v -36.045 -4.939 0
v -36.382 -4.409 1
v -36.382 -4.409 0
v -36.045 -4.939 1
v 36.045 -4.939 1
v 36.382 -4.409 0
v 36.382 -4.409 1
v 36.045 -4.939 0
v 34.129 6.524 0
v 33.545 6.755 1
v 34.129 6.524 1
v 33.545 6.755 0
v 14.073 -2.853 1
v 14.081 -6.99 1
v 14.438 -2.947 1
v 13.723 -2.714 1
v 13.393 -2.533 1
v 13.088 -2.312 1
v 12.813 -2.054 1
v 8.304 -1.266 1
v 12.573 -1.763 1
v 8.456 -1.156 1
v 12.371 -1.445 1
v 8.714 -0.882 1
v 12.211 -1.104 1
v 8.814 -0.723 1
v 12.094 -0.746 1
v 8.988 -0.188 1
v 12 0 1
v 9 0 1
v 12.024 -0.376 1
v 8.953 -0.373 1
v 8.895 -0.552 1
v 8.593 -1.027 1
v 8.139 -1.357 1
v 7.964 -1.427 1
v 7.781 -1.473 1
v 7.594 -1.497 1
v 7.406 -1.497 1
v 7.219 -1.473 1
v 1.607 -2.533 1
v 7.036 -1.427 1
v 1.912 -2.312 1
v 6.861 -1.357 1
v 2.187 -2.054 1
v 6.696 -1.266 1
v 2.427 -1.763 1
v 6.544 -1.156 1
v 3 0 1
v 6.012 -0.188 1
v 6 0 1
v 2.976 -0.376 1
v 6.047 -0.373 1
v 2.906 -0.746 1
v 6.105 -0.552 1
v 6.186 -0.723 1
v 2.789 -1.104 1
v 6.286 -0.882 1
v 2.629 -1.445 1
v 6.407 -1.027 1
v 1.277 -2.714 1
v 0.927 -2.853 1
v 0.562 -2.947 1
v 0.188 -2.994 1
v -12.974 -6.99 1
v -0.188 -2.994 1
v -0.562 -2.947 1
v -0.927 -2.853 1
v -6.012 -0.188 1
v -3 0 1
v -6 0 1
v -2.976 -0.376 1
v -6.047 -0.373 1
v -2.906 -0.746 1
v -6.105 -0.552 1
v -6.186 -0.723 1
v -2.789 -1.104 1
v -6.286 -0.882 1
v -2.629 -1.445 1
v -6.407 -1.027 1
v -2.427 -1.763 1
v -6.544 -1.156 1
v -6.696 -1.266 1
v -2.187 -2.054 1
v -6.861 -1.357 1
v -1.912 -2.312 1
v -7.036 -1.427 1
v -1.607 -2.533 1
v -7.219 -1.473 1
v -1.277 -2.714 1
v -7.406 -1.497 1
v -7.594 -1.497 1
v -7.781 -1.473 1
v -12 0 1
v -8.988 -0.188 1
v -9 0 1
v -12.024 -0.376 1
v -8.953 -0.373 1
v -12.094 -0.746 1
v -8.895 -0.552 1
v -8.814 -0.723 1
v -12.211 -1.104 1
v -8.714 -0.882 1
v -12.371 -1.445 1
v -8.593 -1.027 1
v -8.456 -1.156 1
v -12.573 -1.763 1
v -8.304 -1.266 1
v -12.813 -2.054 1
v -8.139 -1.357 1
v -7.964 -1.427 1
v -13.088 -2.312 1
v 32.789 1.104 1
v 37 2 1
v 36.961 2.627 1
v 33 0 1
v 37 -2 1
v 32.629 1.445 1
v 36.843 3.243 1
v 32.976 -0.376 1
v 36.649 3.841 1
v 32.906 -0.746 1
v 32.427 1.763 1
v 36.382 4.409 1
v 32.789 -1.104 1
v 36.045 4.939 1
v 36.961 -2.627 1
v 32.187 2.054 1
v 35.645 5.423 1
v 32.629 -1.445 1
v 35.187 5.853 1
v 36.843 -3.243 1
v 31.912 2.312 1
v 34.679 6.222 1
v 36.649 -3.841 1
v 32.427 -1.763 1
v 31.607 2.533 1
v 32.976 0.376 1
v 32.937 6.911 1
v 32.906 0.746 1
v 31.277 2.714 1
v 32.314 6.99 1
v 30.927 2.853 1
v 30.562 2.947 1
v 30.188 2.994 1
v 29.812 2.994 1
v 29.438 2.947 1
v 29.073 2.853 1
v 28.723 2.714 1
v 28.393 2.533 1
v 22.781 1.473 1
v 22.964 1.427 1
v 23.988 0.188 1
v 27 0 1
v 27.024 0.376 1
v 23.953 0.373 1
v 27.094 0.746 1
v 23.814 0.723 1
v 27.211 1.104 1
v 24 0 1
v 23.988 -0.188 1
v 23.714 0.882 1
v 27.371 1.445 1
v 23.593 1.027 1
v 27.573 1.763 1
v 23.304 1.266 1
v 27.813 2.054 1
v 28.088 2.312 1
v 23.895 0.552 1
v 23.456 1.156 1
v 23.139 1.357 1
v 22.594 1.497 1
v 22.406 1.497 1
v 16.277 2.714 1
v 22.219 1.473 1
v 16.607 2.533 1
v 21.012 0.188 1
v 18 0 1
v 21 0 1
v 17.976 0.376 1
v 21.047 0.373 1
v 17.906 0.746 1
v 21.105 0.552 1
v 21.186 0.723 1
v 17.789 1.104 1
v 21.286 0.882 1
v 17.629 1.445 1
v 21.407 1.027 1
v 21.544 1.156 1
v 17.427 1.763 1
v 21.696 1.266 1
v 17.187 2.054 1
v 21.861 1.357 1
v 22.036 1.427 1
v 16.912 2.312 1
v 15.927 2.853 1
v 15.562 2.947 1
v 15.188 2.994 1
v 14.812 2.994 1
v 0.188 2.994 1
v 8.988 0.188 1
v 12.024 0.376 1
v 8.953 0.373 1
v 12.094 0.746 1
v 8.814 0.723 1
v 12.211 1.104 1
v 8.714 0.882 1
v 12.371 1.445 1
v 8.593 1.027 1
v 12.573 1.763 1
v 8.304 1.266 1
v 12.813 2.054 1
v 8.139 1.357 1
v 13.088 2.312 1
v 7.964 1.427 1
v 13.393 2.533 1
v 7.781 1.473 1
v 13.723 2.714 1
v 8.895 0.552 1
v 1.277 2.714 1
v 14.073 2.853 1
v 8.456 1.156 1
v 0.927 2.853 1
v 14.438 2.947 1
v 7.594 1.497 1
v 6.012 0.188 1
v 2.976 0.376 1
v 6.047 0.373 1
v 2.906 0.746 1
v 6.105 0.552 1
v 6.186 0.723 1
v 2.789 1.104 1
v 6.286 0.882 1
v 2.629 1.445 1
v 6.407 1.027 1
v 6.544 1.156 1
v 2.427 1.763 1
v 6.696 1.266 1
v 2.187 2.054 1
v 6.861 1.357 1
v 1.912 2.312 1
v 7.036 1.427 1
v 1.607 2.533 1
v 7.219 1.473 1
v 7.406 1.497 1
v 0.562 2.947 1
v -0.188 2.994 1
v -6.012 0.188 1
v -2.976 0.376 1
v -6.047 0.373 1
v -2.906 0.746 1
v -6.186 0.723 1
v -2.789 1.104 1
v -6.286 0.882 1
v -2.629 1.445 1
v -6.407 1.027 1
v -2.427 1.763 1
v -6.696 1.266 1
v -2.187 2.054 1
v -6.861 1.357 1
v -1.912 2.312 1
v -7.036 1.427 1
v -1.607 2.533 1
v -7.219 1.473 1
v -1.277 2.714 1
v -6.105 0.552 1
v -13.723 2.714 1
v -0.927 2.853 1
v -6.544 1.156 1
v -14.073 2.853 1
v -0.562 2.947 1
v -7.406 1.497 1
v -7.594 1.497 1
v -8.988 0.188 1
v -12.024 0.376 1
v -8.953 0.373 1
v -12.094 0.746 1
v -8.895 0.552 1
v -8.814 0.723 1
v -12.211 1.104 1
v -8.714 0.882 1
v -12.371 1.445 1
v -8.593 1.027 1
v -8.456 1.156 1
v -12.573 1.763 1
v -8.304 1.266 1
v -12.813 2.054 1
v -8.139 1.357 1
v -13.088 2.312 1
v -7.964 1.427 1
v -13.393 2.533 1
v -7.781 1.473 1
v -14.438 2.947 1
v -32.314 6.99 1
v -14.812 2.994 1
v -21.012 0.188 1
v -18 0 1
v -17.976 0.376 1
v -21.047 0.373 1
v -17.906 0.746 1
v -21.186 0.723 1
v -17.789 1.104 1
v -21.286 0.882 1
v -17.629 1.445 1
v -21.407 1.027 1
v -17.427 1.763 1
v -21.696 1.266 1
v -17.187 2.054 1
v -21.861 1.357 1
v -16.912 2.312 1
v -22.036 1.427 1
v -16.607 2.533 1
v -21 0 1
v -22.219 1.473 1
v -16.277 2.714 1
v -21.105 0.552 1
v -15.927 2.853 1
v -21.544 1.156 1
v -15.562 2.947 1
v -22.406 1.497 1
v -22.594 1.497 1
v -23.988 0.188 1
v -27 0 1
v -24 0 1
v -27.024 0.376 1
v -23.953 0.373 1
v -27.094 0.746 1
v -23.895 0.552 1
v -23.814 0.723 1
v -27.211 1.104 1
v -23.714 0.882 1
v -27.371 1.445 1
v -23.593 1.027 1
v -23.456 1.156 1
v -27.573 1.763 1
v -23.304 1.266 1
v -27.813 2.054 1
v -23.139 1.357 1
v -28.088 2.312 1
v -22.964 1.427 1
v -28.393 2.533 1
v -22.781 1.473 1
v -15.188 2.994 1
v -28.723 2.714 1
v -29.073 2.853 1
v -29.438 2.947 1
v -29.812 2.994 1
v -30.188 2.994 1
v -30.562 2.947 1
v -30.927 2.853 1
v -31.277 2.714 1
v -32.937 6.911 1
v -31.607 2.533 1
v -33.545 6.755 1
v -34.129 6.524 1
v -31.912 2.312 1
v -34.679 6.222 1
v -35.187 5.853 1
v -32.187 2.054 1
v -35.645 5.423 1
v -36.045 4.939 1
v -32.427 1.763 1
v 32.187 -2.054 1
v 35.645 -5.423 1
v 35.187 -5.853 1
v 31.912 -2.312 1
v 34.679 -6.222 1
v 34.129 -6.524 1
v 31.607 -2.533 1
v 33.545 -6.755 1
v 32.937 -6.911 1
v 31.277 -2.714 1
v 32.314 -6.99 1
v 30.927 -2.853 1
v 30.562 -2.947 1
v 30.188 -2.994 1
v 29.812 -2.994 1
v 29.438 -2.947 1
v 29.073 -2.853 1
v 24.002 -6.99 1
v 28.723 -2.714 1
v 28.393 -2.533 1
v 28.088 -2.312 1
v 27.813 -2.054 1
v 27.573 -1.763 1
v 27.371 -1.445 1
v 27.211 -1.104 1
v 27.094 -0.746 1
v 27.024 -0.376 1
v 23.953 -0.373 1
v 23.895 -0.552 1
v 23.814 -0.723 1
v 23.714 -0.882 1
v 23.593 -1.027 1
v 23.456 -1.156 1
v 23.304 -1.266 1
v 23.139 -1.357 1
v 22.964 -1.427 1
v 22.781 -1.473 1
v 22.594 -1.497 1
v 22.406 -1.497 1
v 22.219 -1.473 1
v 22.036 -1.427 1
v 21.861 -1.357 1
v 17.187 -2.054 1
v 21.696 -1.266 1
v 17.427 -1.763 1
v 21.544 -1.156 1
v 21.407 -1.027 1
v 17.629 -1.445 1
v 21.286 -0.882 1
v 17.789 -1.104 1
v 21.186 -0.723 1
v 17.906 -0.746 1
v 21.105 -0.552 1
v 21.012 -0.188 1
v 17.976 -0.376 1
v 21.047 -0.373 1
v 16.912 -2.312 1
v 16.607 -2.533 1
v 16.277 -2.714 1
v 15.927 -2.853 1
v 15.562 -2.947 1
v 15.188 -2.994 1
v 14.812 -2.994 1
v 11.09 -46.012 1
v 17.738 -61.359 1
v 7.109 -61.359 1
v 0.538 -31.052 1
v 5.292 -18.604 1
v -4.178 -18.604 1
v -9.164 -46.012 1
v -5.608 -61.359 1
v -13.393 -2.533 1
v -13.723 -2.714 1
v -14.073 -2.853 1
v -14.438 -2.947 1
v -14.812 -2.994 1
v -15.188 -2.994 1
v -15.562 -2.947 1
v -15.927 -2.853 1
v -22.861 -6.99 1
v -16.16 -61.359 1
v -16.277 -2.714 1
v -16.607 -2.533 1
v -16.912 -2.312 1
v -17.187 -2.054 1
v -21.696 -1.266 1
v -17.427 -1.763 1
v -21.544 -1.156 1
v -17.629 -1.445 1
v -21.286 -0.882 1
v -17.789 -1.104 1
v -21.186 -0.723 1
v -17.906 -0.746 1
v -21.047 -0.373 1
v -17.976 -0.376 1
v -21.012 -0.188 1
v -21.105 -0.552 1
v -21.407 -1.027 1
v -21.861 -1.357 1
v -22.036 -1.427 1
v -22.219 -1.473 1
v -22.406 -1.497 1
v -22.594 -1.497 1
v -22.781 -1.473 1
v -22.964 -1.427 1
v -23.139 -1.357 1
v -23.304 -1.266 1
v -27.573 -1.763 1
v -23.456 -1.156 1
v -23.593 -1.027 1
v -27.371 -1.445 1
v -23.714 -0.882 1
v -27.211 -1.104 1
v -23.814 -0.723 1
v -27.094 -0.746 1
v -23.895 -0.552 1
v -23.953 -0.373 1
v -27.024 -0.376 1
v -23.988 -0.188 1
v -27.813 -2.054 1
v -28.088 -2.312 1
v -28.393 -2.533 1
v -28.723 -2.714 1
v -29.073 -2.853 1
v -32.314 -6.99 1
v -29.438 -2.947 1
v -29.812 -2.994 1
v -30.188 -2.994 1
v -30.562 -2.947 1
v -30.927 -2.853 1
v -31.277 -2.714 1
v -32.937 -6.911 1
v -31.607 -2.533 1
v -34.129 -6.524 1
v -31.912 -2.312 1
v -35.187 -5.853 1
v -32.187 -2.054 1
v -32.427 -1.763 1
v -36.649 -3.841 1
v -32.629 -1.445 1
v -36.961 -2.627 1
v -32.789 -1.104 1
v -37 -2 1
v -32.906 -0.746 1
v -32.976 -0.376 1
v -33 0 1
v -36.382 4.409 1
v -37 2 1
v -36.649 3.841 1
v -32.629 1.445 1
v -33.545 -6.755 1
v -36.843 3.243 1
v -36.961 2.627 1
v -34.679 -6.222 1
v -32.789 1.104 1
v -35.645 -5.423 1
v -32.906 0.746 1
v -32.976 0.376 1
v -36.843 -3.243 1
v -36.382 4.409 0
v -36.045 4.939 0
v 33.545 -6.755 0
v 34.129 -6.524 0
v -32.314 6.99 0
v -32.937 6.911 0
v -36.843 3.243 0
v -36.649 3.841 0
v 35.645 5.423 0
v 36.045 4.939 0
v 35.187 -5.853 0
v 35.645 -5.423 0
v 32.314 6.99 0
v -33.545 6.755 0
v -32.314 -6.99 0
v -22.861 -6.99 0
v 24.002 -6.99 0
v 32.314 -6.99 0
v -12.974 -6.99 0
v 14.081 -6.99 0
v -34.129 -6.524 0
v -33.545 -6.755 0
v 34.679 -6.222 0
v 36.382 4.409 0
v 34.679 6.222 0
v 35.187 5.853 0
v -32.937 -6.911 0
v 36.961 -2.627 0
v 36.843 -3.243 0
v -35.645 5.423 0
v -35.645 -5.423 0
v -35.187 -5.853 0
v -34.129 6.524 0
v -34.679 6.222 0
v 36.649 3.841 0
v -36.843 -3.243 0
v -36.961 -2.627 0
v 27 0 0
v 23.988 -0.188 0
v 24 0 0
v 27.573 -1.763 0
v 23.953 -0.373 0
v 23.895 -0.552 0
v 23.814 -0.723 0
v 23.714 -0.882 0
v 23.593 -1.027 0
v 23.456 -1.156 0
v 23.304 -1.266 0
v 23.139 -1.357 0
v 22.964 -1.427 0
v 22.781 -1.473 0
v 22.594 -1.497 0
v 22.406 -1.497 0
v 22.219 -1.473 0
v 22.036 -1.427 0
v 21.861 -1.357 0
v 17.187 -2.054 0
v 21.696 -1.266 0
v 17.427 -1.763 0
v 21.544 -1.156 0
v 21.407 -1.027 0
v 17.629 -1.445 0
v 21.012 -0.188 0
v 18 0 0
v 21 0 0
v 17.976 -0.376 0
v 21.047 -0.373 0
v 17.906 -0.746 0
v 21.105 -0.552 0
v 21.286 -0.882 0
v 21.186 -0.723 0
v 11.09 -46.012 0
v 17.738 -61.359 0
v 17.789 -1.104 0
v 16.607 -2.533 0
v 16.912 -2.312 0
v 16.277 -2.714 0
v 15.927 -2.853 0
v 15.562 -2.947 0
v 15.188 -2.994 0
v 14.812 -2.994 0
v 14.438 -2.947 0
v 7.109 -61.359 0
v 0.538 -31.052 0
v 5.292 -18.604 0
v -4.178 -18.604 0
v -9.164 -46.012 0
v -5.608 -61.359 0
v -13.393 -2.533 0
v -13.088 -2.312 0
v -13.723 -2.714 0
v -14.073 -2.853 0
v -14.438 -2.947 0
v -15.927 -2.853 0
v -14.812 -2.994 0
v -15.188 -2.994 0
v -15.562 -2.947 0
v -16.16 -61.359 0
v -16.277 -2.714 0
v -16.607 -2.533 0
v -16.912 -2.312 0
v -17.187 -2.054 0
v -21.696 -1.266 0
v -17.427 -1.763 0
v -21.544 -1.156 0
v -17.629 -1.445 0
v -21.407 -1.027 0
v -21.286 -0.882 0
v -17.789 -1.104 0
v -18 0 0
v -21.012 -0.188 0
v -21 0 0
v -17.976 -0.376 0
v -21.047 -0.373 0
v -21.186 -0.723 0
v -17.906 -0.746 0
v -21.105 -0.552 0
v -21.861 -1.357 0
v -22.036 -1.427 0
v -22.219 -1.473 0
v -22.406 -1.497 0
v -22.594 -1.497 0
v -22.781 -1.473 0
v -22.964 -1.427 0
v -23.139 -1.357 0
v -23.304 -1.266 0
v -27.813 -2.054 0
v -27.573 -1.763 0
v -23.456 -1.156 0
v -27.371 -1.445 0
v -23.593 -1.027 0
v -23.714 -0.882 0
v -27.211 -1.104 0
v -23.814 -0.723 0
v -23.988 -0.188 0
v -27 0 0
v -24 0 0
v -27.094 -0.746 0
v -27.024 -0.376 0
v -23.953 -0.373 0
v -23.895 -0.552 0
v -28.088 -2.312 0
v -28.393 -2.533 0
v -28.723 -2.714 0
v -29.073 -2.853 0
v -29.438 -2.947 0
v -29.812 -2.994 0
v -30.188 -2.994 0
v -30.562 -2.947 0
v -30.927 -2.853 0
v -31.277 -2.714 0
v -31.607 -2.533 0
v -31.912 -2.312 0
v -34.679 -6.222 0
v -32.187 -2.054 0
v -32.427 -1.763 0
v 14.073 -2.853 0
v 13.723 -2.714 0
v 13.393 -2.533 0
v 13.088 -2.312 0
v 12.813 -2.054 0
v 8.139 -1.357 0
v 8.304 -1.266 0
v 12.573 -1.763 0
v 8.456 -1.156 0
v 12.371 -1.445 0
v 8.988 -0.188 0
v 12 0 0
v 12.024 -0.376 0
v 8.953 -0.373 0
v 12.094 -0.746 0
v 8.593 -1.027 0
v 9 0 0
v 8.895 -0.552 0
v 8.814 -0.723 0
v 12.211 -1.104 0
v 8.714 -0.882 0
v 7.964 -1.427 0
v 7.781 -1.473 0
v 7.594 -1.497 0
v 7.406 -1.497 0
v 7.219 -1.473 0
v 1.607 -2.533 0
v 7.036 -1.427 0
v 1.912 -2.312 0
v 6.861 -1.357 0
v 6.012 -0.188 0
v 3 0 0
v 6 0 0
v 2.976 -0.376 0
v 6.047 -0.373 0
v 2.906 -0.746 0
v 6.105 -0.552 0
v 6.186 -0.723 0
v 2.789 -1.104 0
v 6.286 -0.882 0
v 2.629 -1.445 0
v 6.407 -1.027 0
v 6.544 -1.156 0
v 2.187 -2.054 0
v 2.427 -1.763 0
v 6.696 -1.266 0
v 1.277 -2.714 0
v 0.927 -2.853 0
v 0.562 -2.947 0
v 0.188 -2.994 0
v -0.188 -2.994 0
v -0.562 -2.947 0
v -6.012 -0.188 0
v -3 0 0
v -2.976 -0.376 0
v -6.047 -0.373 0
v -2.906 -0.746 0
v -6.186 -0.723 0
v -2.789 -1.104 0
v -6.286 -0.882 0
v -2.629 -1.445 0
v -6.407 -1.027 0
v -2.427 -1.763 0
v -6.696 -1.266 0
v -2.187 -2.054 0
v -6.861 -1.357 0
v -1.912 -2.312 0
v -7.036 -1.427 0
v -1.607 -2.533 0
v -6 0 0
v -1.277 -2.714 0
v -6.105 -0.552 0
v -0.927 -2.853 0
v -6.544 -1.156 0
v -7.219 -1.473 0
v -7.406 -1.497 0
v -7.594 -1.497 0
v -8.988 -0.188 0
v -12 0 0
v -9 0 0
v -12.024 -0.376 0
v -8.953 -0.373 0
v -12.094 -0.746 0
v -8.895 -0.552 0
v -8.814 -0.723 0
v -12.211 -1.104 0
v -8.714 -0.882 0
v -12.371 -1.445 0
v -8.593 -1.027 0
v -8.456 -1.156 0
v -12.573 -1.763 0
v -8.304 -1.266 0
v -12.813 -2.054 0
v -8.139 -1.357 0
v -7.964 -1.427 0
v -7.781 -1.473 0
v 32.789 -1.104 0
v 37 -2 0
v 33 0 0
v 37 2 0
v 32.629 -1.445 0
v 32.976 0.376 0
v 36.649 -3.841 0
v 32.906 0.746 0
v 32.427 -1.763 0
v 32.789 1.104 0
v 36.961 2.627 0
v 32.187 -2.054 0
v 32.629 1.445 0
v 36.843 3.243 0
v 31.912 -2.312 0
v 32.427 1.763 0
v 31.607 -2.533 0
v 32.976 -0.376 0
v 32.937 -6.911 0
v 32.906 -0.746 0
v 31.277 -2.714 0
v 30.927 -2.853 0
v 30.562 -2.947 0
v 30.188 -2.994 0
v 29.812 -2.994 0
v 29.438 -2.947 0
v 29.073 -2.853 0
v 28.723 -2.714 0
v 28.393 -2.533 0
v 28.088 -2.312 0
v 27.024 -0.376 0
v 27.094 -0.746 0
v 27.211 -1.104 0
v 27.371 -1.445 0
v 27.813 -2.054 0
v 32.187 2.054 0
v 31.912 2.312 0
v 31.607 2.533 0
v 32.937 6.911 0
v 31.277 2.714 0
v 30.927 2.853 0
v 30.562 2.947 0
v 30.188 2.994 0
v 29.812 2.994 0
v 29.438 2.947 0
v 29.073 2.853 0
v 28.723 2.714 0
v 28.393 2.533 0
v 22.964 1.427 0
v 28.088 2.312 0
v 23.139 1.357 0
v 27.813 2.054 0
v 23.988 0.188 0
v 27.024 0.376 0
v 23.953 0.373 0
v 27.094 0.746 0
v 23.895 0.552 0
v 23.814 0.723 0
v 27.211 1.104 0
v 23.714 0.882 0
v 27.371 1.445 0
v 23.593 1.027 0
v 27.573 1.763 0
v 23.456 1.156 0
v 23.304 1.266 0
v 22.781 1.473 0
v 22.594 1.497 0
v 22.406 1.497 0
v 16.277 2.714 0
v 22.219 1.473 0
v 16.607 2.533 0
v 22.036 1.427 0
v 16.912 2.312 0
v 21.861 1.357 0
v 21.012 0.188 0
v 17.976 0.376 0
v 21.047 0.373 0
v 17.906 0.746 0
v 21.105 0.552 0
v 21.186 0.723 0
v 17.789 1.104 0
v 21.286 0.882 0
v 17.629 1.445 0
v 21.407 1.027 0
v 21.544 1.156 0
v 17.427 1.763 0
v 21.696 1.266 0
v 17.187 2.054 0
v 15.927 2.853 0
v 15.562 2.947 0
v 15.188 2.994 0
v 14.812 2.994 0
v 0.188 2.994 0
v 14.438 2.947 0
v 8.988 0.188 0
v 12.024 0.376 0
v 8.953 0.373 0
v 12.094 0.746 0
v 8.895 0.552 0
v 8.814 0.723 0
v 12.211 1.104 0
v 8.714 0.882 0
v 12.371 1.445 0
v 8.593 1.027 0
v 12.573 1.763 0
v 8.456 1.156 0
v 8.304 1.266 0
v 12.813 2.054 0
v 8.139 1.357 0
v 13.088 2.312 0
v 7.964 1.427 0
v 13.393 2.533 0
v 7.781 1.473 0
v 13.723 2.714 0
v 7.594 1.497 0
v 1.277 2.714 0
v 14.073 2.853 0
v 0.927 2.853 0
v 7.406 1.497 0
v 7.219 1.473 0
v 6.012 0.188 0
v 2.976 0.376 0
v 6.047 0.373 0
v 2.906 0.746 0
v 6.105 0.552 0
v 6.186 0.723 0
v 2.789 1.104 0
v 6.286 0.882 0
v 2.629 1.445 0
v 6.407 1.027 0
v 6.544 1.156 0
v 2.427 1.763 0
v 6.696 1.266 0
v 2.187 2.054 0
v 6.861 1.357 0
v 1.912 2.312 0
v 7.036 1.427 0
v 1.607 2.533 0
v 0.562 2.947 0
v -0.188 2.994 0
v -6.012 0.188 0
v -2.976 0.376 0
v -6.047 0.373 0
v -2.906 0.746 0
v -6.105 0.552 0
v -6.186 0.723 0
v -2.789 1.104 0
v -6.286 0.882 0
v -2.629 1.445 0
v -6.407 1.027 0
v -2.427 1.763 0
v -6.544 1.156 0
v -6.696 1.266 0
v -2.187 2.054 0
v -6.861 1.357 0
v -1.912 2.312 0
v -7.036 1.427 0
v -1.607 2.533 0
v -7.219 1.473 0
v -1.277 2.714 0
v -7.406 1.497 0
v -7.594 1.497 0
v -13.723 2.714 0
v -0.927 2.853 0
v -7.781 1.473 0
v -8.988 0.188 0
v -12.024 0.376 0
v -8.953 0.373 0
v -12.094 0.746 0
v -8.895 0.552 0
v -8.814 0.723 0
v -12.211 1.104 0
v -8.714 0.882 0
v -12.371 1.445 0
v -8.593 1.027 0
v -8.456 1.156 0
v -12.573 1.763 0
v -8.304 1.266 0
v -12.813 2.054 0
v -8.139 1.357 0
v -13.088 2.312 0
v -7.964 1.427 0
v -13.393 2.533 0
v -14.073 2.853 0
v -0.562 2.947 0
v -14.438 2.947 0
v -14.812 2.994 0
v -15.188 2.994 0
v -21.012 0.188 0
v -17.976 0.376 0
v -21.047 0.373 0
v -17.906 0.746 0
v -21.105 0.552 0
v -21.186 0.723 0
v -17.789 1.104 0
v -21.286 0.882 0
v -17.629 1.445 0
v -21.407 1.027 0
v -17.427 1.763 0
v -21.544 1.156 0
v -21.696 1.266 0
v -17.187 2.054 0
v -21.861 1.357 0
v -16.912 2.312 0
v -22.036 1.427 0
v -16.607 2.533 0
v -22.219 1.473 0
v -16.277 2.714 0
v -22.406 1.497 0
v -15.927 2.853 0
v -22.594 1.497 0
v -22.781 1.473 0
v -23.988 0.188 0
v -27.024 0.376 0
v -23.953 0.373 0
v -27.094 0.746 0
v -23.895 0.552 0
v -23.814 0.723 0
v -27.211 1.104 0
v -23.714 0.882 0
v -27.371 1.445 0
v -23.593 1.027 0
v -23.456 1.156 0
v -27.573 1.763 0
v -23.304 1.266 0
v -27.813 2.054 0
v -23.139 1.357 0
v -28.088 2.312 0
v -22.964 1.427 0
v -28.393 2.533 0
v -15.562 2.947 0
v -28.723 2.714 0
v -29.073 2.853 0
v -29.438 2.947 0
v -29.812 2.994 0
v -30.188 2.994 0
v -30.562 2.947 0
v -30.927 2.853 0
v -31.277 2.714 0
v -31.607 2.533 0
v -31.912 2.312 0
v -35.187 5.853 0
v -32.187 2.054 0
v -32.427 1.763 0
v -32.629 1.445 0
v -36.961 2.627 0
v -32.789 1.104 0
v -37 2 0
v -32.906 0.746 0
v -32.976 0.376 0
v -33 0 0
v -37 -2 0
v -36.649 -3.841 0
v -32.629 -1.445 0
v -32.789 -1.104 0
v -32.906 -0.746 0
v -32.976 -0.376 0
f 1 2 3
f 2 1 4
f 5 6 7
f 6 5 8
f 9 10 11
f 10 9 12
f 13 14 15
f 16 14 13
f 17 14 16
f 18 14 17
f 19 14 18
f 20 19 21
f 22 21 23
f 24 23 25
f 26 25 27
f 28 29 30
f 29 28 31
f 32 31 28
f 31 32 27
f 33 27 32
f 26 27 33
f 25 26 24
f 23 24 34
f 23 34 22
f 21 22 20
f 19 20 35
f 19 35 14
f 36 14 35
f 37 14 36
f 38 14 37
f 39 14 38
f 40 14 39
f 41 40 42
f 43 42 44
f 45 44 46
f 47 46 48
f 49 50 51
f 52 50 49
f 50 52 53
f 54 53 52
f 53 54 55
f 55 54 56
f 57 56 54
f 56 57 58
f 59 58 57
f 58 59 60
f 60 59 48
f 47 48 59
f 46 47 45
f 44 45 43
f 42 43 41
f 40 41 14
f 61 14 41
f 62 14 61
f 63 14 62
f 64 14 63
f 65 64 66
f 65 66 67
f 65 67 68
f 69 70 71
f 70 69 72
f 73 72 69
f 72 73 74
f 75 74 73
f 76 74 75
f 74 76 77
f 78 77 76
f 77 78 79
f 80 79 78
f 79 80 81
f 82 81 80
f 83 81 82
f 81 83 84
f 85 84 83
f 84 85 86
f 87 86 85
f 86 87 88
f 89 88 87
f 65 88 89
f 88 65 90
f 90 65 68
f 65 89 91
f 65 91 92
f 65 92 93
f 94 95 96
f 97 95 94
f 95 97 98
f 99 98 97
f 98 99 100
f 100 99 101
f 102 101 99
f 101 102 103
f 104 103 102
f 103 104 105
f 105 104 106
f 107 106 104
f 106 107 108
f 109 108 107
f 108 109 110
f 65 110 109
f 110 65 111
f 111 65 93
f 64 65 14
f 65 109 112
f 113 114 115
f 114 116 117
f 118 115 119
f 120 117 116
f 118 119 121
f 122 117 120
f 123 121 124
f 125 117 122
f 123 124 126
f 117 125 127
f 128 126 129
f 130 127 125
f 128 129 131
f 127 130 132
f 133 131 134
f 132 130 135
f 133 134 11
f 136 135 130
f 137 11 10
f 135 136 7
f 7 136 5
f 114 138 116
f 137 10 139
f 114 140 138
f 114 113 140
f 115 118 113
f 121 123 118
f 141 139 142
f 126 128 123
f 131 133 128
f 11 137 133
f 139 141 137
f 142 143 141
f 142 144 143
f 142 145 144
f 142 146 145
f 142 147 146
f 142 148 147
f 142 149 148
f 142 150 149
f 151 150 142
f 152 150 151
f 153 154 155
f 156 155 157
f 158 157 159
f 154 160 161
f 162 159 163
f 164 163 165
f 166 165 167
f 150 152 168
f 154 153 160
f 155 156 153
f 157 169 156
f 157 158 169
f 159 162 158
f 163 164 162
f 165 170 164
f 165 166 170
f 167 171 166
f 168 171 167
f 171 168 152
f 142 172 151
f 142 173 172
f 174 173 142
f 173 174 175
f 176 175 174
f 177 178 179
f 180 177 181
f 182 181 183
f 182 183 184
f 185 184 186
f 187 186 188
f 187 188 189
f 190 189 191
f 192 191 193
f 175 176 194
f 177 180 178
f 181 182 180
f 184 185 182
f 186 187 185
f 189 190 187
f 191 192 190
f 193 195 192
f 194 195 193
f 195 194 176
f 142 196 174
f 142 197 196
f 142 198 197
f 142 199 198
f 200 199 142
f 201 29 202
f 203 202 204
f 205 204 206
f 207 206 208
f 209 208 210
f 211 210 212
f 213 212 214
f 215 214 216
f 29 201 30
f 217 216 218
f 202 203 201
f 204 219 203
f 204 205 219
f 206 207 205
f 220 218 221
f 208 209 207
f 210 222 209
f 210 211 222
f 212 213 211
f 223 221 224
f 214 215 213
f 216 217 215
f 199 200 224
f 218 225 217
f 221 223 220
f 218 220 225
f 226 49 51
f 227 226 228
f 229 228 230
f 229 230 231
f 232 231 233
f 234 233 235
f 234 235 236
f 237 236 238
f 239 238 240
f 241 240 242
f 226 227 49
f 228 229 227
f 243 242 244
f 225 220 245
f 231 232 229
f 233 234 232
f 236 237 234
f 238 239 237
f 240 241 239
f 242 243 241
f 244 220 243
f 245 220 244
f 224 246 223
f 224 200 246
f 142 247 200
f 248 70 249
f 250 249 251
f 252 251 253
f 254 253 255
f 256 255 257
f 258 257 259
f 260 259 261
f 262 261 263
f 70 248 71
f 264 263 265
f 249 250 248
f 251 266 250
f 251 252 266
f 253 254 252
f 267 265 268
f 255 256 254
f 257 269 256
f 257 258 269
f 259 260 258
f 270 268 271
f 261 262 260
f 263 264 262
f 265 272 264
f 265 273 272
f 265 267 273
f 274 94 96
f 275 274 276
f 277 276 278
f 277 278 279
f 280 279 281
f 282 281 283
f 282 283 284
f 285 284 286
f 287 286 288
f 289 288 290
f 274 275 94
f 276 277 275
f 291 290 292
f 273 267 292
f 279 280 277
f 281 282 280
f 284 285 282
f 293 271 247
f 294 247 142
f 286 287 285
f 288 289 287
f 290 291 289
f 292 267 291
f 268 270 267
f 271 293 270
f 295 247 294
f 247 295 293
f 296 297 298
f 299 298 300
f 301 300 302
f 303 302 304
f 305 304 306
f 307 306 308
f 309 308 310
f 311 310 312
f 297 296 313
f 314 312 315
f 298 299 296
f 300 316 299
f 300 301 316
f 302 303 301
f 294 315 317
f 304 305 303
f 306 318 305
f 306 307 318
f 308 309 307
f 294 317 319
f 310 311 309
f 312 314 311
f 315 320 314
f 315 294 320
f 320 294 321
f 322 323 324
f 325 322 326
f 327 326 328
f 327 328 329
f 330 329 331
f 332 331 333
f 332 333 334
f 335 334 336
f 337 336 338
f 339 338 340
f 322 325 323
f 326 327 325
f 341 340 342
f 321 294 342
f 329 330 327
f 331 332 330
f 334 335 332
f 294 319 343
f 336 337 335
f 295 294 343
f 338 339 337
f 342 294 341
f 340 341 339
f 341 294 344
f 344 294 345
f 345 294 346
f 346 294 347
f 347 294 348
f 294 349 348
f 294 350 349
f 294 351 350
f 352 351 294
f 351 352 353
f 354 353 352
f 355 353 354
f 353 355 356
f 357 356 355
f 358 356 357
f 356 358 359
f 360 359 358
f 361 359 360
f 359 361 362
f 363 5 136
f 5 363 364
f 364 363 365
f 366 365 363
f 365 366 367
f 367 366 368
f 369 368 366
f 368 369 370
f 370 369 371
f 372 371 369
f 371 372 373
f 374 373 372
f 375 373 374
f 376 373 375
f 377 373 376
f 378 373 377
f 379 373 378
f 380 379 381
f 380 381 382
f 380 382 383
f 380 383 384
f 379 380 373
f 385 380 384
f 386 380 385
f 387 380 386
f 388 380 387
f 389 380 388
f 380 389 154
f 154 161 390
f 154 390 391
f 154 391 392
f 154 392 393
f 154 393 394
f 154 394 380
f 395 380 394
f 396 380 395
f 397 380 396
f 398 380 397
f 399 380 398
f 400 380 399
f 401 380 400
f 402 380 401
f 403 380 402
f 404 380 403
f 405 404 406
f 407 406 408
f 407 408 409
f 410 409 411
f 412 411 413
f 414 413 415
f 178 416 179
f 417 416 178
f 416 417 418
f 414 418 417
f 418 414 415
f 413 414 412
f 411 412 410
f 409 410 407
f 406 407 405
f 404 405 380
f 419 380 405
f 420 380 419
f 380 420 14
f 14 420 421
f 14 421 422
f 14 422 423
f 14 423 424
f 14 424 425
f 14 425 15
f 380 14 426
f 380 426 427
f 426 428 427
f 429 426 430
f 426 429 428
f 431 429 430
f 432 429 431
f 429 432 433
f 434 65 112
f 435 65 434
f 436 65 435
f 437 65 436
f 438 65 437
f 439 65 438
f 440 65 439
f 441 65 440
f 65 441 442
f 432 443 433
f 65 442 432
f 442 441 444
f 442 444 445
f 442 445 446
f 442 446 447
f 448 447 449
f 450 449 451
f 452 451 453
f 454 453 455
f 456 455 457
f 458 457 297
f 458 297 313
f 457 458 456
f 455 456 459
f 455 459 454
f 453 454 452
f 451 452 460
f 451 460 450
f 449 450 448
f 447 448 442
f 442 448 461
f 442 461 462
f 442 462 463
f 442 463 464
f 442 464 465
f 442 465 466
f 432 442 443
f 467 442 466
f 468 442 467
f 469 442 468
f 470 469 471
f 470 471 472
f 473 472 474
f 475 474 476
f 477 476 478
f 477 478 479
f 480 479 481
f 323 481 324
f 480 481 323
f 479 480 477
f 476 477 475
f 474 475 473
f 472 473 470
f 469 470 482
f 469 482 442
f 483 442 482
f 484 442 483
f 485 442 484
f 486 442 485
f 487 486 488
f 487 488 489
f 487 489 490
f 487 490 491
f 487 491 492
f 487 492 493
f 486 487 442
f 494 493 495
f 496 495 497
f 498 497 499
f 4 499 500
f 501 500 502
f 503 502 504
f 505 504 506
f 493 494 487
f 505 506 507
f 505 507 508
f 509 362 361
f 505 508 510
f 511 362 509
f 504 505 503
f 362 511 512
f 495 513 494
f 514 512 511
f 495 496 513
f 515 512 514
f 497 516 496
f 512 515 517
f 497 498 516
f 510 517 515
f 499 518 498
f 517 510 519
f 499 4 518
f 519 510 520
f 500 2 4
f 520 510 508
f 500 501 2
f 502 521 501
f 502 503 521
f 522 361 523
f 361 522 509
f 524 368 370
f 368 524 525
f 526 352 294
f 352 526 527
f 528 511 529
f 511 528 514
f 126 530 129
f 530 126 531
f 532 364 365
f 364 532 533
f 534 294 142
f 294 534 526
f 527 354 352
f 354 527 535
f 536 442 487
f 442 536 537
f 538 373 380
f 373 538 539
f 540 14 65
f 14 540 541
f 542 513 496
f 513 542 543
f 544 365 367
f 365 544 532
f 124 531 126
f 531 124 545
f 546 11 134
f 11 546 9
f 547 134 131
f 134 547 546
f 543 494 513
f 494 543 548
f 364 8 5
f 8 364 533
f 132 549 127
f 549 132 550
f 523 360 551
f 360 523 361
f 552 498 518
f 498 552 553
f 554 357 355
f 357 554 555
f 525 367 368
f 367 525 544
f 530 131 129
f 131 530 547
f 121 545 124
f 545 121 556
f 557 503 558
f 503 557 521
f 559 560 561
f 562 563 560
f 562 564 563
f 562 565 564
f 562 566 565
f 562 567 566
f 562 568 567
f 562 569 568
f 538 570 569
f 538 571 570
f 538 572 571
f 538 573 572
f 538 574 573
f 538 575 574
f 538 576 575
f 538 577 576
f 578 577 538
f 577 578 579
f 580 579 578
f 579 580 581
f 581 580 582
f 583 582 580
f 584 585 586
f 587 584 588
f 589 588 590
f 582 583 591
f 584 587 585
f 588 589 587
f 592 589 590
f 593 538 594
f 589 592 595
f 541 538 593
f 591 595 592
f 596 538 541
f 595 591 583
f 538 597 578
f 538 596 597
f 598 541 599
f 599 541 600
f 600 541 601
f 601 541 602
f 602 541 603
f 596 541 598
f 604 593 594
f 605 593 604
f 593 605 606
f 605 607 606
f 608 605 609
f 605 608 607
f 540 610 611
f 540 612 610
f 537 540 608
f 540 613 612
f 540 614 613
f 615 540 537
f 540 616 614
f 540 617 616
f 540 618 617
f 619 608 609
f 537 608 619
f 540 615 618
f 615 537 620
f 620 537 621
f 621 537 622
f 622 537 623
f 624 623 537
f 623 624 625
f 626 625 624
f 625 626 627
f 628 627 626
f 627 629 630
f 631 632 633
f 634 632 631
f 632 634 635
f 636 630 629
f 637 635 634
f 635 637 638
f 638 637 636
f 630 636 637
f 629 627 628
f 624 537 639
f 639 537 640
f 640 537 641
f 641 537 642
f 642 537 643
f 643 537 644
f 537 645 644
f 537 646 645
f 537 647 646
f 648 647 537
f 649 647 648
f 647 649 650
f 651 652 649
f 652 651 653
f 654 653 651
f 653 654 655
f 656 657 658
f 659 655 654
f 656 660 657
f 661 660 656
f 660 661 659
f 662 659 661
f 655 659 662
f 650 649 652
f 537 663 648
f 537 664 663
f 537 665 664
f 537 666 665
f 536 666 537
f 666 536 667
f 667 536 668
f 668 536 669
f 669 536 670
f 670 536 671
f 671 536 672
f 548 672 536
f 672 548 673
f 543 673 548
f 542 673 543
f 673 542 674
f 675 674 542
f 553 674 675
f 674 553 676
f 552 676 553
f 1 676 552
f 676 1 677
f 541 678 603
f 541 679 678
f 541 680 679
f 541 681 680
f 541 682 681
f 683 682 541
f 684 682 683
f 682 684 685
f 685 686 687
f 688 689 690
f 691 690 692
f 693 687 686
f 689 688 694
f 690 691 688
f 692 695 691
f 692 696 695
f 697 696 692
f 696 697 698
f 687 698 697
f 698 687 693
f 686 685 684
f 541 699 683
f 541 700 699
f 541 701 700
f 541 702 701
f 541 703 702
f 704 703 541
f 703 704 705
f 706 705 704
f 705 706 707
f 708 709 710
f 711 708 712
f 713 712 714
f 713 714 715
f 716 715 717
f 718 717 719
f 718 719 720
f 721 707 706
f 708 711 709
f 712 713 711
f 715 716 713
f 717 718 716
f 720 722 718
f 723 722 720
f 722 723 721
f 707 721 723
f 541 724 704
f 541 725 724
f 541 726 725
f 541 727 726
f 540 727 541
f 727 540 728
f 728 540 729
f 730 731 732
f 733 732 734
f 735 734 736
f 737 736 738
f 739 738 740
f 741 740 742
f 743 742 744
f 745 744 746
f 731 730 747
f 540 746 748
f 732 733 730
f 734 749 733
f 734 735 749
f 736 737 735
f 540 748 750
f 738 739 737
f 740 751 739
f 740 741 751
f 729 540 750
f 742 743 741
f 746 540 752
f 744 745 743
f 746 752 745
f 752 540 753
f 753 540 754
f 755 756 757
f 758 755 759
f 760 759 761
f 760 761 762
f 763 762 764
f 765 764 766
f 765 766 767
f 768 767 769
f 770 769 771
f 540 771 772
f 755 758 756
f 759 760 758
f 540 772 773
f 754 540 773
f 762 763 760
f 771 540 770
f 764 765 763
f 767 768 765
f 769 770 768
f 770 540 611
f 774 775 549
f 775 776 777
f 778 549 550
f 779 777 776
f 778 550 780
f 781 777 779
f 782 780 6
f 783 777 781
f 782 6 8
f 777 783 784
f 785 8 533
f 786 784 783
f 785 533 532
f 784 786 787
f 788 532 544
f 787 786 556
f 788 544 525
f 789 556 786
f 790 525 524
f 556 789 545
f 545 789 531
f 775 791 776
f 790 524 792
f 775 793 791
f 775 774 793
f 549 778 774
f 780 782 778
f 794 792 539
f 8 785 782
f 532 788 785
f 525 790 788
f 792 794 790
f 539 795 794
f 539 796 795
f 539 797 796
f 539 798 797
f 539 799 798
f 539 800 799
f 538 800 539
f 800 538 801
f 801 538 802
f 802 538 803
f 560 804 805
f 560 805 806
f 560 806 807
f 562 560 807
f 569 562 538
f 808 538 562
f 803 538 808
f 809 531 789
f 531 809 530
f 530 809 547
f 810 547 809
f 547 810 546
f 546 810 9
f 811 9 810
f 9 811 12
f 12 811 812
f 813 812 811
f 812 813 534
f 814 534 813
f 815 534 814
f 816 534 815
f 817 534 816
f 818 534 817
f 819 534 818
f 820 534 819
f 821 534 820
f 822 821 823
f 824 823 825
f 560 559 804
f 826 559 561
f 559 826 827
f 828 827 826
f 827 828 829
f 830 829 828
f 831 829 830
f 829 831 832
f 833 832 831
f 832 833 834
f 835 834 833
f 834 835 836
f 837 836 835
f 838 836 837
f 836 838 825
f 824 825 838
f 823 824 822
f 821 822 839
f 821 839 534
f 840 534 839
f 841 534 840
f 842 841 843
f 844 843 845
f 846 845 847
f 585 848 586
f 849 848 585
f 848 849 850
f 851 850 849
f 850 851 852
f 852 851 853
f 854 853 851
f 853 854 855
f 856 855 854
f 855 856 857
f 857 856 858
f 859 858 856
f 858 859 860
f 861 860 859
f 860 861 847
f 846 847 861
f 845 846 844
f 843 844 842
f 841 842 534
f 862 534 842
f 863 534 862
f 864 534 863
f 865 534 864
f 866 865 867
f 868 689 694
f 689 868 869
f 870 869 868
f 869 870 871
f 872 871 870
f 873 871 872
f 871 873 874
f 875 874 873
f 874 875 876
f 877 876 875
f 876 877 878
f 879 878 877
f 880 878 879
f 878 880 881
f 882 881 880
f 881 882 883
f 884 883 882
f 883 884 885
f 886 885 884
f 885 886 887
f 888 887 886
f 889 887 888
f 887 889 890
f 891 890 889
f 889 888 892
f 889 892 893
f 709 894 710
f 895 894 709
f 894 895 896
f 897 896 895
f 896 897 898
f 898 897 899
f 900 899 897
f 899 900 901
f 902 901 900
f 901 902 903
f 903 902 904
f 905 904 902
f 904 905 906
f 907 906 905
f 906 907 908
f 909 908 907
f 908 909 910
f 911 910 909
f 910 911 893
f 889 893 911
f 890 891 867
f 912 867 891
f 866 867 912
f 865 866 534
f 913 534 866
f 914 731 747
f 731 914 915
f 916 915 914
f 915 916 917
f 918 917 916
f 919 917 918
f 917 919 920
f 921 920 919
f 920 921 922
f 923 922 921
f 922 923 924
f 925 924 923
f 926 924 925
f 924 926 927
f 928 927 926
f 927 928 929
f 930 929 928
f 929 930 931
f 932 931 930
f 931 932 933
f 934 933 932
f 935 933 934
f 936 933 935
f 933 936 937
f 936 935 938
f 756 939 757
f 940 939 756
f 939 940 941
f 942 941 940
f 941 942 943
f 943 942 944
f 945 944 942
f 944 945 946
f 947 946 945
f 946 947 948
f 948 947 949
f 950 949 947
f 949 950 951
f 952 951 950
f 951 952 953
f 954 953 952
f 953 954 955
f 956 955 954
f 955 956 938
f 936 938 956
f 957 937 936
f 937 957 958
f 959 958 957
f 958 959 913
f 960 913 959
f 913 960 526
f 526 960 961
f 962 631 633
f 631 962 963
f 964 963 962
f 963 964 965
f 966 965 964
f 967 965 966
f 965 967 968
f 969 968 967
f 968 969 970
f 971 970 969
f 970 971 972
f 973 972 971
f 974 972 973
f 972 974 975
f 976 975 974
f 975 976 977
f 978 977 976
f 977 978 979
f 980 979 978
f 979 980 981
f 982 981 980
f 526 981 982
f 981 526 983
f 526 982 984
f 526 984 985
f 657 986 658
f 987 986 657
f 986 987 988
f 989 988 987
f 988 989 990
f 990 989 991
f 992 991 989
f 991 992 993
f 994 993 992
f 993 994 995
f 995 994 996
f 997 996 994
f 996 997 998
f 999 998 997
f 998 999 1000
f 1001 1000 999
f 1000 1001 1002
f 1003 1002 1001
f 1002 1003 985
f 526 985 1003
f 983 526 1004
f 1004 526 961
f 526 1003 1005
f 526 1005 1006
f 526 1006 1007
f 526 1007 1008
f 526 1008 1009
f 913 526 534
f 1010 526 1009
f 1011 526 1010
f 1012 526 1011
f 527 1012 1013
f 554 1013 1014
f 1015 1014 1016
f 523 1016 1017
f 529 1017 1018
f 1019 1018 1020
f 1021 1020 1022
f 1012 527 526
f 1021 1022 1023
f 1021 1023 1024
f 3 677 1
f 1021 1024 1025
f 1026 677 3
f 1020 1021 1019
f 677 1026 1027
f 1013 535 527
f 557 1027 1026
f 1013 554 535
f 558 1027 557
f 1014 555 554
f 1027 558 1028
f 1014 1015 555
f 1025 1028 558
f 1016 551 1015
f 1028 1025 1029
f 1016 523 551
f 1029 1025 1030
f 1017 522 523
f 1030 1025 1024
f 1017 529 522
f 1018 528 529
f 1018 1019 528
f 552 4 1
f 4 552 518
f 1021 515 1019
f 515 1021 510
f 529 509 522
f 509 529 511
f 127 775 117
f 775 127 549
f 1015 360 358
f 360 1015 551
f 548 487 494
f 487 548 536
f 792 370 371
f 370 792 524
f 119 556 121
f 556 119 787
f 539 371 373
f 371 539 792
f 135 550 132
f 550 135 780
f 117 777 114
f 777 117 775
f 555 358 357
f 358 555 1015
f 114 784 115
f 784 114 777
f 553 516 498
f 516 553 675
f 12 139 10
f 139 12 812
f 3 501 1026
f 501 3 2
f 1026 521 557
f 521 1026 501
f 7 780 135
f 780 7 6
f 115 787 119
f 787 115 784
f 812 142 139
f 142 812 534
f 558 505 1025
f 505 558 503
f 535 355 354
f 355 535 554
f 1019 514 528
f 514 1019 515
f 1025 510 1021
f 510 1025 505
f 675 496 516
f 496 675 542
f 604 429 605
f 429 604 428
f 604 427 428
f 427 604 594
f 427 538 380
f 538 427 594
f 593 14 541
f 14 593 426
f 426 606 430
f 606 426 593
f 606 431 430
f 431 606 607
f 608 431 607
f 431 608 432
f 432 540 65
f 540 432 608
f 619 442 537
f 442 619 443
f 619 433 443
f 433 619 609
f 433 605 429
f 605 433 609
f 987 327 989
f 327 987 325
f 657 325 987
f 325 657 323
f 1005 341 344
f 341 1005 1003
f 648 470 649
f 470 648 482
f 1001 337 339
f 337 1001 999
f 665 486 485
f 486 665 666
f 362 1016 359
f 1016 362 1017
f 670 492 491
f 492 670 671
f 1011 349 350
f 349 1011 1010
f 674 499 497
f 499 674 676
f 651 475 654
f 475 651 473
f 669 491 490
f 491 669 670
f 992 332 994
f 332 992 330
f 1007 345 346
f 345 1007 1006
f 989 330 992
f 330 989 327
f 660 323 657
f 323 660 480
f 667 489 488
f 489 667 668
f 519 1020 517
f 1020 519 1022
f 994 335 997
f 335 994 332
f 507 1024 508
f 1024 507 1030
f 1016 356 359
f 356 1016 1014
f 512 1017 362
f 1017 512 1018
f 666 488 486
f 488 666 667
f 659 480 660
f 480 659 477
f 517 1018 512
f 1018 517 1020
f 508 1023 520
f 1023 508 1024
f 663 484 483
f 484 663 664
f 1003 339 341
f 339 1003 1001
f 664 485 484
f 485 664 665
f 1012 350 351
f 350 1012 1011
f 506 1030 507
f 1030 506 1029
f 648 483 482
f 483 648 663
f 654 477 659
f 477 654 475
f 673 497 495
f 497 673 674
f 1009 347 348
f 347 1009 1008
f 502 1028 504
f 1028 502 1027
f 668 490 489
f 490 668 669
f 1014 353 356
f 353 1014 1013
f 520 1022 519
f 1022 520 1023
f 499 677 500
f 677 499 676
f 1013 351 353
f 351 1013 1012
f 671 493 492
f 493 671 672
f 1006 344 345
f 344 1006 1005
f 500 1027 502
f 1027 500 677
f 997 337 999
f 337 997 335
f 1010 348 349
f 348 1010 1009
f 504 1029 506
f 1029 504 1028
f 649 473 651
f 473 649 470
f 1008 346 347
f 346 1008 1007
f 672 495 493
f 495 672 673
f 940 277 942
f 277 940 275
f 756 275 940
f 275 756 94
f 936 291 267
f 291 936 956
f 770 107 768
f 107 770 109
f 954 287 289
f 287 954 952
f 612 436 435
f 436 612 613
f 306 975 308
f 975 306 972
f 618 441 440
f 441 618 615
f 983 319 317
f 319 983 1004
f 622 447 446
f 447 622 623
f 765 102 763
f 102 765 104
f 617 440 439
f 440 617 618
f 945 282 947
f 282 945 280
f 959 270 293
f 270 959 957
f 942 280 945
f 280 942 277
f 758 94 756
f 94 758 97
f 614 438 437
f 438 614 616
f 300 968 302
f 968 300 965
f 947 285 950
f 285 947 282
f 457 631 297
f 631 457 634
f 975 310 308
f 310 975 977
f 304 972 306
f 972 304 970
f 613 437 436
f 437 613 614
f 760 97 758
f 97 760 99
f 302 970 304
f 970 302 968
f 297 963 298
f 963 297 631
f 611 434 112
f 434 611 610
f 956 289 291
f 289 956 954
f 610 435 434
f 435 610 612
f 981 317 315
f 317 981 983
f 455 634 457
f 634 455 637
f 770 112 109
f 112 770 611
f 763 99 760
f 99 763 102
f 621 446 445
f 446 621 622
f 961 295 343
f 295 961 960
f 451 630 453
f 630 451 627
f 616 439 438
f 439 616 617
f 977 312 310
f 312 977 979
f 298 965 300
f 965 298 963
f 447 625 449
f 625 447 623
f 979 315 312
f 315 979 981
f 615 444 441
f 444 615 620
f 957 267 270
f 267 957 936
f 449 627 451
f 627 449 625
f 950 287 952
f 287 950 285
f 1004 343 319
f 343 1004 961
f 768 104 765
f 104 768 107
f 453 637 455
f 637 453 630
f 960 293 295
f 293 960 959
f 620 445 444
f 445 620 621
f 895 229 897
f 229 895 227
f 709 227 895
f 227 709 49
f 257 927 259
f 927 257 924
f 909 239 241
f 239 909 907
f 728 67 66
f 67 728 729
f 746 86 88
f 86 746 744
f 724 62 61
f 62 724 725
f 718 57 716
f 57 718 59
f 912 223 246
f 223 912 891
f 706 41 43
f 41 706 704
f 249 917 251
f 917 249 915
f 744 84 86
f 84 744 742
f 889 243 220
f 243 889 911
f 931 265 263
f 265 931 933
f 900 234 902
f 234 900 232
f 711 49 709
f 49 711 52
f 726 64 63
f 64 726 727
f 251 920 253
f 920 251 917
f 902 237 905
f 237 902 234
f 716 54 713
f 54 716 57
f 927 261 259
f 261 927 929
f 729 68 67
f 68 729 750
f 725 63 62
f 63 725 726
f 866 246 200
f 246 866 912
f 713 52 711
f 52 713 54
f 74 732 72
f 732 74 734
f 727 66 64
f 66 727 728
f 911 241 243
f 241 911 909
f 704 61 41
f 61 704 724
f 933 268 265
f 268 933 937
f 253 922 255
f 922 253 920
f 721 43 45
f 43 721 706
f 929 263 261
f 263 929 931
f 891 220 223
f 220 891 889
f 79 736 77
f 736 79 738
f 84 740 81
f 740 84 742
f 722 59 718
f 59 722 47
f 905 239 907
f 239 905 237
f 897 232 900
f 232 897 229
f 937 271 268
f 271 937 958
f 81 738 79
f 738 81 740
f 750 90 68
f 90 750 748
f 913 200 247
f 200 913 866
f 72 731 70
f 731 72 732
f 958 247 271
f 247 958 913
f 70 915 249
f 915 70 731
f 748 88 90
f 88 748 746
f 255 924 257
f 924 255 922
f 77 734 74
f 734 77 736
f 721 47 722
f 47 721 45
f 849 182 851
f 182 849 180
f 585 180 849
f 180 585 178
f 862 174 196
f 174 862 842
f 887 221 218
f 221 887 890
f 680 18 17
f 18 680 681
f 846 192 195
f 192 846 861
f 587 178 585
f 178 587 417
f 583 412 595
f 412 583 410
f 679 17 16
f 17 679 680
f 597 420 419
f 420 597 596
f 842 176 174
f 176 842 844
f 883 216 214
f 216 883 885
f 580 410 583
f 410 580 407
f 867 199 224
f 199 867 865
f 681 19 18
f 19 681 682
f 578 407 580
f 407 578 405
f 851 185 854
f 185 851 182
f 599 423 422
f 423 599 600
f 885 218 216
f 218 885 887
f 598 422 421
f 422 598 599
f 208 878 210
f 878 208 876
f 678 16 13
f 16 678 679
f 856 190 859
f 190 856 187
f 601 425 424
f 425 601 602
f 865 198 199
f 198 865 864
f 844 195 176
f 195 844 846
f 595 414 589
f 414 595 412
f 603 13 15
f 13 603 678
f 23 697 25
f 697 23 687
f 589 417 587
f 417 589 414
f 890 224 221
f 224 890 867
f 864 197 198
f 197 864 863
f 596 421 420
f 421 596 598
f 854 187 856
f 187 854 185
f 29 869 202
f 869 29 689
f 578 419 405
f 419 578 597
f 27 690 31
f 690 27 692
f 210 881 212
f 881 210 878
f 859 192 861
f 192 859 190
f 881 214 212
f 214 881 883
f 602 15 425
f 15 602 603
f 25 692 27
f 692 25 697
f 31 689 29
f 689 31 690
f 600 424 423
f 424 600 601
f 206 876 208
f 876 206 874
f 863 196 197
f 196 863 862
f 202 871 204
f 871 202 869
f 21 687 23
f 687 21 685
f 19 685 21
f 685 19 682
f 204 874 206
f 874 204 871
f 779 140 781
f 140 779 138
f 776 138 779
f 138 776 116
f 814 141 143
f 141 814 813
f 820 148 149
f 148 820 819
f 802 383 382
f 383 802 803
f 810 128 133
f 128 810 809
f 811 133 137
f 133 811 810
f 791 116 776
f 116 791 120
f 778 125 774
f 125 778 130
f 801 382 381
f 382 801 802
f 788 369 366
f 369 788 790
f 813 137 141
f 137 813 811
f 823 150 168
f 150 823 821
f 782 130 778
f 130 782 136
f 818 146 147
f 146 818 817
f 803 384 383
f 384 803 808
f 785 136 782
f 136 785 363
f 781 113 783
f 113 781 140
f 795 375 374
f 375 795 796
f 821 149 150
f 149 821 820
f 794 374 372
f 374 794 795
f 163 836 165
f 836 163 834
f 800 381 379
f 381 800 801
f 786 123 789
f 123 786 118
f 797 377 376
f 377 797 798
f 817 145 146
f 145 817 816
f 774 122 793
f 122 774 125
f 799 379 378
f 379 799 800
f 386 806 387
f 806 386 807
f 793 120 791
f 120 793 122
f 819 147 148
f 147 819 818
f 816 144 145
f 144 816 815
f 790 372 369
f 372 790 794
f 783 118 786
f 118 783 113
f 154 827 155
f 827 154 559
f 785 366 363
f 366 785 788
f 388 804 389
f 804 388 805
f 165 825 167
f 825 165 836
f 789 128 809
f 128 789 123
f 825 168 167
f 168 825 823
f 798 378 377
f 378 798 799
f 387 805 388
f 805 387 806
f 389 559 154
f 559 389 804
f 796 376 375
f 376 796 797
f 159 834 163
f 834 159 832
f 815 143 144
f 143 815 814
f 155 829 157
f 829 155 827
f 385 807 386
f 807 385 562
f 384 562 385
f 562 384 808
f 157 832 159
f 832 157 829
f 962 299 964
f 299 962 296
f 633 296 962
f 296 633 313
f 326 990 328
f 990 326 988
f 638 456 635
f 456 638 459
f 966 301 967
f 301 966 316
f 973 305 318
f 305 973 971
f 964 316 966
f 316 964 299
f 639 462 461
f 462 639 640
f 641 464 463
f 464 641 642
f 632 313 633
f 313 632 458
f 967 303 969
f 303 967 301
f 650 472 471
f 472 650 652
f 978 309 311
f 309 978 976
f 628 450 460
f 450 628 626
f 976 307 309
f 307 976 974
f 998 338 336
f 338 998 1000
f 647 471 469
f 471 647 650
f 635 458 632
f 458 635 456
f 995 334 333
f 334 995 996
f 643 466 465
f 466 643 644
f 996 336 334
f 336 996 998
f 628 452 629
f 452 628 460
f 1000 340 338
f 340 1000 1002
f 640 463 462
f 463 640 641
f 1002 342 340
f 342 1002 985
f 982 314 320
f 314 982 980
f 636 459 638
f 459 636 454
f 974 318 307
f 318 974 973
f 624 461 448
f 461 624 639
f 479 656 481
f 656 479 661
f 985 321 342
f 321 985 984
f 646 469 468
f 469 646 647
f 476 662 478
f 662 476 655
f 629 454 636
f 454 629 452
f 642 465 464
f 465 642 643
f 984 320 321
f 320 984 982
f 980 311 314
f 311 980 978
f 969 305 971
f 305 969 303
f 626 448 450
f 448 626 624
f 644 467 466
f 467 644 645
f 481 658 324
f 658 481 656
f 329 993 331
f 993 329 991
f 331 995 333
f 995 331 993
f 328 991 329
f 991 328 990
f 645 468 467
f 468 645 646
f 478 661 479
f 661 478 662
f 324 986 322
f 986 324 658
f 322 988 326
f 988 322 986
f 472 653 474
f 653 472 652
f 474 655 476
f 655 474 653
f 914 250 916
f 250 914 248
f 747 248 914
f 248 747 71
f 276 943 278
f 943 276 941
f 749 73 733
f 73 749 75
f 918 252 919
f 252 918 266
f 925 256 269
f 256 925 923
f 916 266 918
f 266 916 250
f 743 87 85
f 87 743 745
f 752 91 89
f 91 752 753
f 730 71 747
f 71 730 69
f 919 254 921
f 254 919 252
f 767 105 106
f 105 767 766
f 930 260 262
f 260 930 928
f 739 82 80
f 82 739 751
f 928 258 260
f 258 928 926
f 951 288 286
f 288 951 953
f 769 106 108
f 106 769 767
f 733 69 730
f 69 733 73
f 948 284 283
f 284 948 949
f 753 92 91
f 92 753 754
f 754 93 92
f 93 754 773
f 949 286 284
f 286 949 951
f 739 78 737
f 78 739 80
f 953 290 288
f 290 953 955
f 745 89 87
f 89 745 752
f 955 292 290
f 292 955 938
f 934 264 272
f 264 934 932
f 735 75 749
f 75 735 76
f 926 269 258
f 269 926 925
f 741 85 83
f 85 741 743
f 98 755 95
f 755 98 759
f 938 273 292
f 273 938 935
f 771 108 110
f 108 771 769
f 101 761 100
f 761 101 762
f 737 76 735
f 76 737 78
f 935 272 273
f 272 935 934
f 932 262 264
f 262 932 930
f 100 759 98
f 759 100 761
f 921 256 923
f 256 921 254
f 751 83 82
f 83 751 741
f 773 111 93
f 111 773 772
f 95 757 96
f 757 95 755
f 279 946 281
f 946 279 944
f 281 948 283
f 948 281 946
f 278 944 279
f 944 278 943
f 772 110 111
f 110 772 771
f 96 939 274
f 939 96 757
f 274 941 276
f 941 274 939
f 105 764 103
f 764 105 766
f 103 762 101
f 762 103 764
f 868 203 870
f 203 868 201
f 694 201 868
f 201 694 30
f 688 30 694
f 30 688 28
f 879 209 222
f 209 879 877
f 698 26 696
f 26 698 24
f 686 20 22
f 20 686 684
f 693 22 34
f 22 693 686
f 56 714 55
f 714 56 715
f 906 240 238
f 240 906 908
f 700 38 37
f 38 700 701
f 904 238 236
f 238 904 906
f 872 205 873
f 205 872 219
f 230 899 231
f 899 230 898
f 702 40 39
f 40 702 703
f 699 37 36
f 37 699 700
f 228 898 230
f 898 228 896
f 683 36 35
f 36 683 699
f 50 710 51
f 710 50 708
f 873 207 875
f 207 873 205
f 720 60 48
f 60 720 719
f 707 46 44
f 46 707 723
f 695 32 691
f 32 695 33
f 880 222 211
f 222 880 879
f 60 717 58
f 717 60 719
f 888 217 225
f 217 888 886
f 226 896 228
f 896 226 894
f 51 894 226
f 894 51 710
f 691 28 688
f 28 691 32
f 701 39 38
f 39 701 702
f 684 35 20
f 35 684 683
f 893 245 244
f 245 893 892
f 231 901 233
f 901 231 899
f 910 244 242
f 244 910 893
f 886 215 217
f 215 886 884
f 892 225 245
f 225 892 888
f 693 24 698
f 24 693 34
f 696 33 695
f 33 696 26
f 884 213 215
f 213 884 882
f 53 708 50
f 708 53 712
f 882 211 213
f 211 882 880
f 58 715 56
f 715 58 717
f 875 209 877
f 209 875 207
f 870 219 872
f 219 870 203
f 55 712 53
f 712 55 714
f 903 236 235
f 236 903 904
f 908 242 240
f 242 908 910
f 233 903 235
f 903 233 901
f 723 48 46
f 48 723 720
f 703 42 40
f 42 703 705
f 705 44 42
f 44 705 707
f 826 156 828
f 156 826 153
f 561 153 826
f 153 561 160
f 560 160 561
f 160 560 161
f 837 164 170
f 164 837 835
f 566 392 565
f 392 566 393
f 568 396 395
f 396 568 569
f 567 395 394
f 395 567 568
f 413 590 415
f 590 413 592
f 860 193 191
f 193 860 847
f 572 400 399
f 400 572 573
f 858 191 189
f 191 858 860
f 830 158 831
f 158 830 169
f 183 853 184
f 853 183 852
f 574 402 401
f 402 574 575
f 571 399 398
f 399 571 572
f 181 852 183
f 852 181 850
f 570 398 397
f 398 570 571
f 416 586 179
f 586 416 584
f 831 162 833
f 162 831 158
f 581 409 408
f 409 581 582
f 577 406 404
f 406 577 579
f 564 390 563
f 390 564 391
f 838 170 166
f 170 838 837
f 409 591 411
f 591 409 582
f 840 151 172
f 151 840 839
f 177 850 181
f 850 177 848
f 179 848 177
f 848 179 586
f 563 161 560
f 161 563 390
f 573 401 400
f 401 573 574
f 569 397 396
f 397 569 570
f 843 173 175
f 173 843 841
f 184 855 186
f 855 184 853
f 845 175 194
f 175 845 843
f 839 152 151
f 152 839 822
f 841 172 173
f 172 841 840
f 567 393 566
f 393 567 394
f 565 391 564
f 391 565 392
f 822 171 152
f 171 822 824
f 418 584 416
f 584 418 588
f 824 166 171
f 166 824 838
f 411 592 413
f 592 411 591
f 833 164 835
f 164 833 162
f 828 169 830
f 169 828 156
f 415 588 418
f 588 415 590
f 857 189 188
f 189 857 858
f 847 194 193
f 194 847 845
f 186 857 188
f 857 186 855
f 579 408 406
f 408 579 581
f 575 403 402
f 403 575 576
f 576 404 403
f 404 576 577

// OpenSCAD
$fn = 50;


difference() {
	union() {
		*color(alpha = 1.0000000000, c = "gray") {
			translate(v = [0, 14, 0]) {
				linear_extrude(height = 1) {
					text(font = "Arial:style=Bold", halign = "center", size = 4.5000000000, text = "COMMENT description oobb_plate_shape_p_type_1_depth_5_width_1_thickness_w_extra_oobb_size", valign = "center");
				}
			}
		}
		hull() {
			translate(v = [-32.0000000000, 2.0000000000, 0]) {
				cylinder(h = 1, r = 5);
			}
			translate(v = [32.0000000000, 2.0000000000, 0]) {
				cylinder(h = 1, r = 5);
			}
			translate(v = [-32.0000000000, -2.0000000000, 0]) {
				cylinder(h = 1, r = 5);
			}
			translate(v = [32.0000000000, -2.0000000000, 0]) {
				cylinder(h = 1, r = 5);
			}
		}
		translate(v = [0, -5, 0]) {
			linear_extrude(height = 1) {
				text(font = "DejaVu Sans Mono:style=Bold", halign = "center", size = 57.0000000000, text = "W", valign = "top");
			}
		}
	}
	union() {
		*color(alpha = 1.0000000000, c = "gray") {
			translate(v = [0, 14, 0]) {
				linear_extrude(height = 1) {
					text(font = "Arial:style=Bold", halign = "center", size = 4.5000000000, text = "COMMENT description oobb_holes_shape_n_type_5_width_1_thickness_w_extra_oobb_size_1_height_'all'_holes_true_both_holes", valign = "center");
				}
			}
		}
		translate(v = [-30.0000000000, 0.0000000000, 0]) {
			translate(v = [0, 0, -50]) {
				cylinder(h = 100, r = 3.0000000000);
			}
		}
		translate(v = [-15.0000000000, 0.0000000000, 0]) {
			translate(v = [0, 0, -50]) {
				cylinder(h = 100, r = 3.0000000000);
			}
		}
		translate(v = [0, 0, -50]) {
			cylinder(h = 100, r = 3.0000000000);
		}
		translate(v = [15.0000000000, 0.0000000000, 0]) {
			translate(v = [0, 0, -50]) {
				cylinder(h = 100, r = 3.0000000000);
			}
		}
		translate(v = [30.0000000000, 0.0000000000, 0]) {
			translate(v = [0, 0, -50]) {
				cylinder(h = 100, r = 3.0000000000);
			}
		}
		translate(v = [-30.0000000000, 0.0000000000, 0]) {
			translate(v = [0, 0, -50]) {
				cylinder(h = 100, r = 1.5000000000);
			}
		}
		translate(v = [-22.5000000000, 0.0000000000, 0]) {
			translate(v = [0, 0, -50]) {
				cylinder(h = 100, r = 1.5000000000);
			}
		}
		translate(v = [-15.0000000000, 0.0000000000, 0]) {
			translate(v = [0, 0, -50]) {
				cylinder(h = 100, r = 1.5000000000);
			}
		}
		translate(v = [-7.5000000000, 0.0000000000, 0]) {
			translate(v = [0, 0, -50]) {
				cylinder(h = 100, r = 1.5000000000);
			}
		}
		translate(v = [0, 0, -50]) {
			cylinder(h = 100, r = 1.5000000000);
		}
		translate(v = [7.5000000000, 0.0000000000, 0]) {
			translate(v = [0, 0, -50]) {
				cylinder(h = 100, r = 1.5000000000);
			}
		}
		translate(v = [15.0000000000, 0.0000000000, 0]) {
			translate(v = [0, 0, -50]) {
				cylinder(h = 100, r = 1.5000000000);
			}
		}
		translate(v = [22.5000000000, 0.0000000000, 0]) {
			translate(v = [0, 0, -50]) {
				cylinder(h = 100, r = 1.5000000000);
			}
		}
		translate(v = [30.0000000000, 0.0000000000, 0]) {
			translate(v = [0, 0, -50]) {
				cylinder(h = 100, r = 1.5000000000);
			}
		}
	}
}
